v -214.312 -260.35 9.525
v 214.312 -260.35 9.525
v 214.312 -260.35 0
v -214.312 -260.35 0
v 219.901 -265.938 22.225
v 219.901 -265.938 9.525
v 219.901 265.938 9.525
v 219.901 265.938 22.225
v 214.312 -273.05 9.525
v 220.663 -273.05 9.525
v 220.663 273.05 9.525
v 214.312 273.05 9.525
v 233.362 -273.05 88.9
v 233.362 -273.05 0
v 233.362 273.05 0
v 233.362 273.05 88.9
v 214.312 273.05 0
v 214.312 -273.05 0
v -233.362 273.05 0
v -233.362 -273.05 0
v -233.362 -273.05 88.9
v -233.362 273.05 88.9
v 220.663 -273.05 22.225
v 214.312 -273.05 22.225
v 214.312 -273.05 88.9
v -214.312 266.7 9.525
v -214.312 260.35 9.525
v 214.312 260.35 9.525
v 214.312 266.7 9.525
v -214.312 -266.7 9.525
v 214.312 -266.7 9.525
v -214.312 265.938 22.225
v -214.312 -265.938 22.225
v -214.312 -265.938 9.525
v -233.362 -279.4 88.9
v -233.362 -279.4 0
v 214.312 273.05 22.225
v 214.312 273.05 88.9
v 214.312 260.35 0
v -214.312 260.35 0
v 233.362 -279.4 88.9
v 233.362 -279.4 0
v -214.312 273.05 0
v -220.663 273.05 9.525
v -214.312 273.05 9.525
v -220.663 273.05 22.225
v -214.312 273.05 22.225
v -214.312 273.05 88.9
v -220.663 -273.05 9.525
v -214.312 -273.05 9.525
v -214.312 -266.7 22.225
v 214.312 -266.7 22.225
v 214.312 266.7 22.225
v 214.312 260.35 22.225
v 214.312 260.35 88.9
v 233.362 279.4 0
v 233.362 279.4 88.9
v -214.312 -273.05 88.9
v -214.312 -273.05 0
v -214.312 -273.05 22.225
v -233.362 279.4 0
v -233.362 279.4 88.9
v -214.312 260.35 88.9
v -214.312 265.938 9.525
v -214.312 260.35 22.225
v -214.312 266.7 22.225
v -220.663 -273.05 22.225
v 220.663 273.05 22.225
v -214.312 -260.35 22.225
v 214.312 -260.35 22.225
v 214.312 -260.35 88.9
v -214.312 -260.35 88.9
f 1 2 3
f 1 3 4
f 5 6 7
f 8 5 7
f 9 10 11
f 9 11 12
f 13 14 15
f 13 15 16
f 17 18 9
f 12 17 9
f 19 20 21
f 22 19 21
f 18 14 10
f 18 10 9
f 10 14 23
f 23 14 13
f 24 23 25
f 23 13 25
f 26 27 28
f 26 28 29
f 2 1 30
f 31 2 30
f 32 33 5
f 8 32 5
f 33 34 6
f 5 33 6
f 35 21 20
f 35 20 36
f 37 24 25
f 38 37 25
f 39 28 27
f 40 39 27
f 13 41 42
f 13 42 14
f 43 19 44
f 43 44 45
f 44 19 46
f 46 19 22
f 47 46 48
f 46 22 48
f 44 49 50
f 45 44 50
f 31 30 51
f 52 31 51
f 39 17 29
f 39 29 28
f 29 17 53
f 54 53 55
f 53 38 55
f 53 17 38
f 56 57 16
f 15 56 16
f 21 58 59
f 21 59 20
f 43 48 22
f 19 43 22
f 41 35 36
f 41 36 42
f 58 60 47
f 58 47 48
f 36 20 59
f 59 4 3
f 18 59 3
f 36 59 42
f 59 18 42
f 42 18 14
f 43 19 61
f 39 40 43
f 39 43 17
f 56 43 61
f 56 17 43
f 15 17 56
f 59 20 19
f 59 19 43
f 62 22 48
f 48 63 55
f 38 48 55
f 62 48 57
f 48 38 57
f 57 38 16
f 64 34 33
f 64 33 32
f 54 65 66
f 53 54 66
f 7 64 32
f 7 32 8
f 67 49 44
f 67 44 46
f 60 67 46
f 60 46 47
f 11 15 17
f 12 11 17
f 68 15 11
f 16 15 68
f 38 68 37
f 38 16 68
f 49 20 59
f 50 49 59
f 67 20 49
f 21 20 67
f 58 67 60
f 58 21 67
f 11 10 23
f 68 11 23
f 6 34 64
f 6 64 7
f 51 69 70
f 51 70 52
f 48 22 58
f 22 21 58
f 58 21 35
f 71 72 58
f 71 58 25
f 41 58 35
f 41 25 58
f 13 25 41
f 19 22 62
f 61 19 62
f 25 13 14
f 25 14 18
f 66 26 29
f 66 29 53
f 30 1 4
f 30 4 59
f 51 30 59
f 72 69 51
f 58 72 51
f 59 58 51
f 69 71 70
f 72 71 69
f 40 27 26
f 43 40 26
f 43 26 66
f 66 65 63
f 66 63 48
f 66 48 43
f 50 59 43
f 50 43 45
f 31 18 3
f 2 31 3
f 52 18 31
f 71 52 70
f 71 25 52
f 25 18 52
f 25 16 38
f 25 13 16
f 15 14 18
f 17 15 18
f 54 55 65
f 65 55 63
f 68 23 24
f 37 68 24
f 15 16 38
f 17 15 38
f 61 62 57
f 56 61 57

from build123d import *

# Parameters (mm, degrees)
F0_W      = 19.05
F0_H      = 88.9
F1_DEPTH  = 273.05
F2_W      = 6.35
F2_H      = 12.7
F3_DEPTH  = 546.101
F6_DEPTH  = 88.9
F7_W      = 6.35
F7_H      = 12.7
F8_DEPTH  = 428.625
F10_W     = 434.213
F10_H     = 531.876
F11_DEPTH = 12.7


with BuildPart() as f1:
    # F0 (on Front) → F1 (new body, symmetric)
    with BuildSketch(Plane.XZ):
        with Locations((-223.8375, 44.45)):
            Rectangle(F0_W, F0_H)
    extrude(amount=F1_DEPTH, both=True)

    # F2 (on face) → F3 (cut, through all)
    with BuildSketch(Plane.XZ.offset(273.05)):
        with Locations((-217.4875, 15.875)):
            Rectangle(F2_W, F2_H)
    extrude(amount=-F3_DEPTH, mode=Mode.SUBTRACT)


with BuildPart() as f4_1:
    # F4: instance of F1
    add(f1.part.mirror(Plane.YZ))


with BuildPart() as f6:
    # F5 (on face) → F6 (new body, through all)
    with BuildSketch(Plane.XY.offset(88.9)):
        Polygon((214.3125, -260.35), (-214.3125, -260.35), (-214.3125, -273.05), (-233.3625, -273.05), (-233.3625, -279.4), (233.3625, -279.4), (233.3625, -273.05), (214.3125, -273.05), align=None)
    extrude(amount=-F6_DEPTH)

    # F7 (on face) → F8 (cut, through all)
    with BuildSketch(Plane(origin=(-214.3125, 0, 0), x_dir=(0, -1, 0), z_dir=(-1, 0, 0))):
        with Locations((263.525, 15.875)):
            Rectangle(F7_W, F7_H)
    extrude(amount=-F8_DEPTH, mode=Mode.SUBTRACT)


with BuildPart() as f9_1:
    # F9: instance of F6
    add(f6.part.mirror(Plane.XZ))


with BuildPart() as f11:
    # F10 (on face) → F11 (new body)
    with BuildSketch(Plane.XY.offset(9.525)):
        with Locations((2.794, 0)):
            Rectangle(F10_W, F10_H)
    extrude(amount=F11_DEPTH)


solid = Compound([f1.part, f4_1.part, f6.part, f9_1.part, f11.part])
